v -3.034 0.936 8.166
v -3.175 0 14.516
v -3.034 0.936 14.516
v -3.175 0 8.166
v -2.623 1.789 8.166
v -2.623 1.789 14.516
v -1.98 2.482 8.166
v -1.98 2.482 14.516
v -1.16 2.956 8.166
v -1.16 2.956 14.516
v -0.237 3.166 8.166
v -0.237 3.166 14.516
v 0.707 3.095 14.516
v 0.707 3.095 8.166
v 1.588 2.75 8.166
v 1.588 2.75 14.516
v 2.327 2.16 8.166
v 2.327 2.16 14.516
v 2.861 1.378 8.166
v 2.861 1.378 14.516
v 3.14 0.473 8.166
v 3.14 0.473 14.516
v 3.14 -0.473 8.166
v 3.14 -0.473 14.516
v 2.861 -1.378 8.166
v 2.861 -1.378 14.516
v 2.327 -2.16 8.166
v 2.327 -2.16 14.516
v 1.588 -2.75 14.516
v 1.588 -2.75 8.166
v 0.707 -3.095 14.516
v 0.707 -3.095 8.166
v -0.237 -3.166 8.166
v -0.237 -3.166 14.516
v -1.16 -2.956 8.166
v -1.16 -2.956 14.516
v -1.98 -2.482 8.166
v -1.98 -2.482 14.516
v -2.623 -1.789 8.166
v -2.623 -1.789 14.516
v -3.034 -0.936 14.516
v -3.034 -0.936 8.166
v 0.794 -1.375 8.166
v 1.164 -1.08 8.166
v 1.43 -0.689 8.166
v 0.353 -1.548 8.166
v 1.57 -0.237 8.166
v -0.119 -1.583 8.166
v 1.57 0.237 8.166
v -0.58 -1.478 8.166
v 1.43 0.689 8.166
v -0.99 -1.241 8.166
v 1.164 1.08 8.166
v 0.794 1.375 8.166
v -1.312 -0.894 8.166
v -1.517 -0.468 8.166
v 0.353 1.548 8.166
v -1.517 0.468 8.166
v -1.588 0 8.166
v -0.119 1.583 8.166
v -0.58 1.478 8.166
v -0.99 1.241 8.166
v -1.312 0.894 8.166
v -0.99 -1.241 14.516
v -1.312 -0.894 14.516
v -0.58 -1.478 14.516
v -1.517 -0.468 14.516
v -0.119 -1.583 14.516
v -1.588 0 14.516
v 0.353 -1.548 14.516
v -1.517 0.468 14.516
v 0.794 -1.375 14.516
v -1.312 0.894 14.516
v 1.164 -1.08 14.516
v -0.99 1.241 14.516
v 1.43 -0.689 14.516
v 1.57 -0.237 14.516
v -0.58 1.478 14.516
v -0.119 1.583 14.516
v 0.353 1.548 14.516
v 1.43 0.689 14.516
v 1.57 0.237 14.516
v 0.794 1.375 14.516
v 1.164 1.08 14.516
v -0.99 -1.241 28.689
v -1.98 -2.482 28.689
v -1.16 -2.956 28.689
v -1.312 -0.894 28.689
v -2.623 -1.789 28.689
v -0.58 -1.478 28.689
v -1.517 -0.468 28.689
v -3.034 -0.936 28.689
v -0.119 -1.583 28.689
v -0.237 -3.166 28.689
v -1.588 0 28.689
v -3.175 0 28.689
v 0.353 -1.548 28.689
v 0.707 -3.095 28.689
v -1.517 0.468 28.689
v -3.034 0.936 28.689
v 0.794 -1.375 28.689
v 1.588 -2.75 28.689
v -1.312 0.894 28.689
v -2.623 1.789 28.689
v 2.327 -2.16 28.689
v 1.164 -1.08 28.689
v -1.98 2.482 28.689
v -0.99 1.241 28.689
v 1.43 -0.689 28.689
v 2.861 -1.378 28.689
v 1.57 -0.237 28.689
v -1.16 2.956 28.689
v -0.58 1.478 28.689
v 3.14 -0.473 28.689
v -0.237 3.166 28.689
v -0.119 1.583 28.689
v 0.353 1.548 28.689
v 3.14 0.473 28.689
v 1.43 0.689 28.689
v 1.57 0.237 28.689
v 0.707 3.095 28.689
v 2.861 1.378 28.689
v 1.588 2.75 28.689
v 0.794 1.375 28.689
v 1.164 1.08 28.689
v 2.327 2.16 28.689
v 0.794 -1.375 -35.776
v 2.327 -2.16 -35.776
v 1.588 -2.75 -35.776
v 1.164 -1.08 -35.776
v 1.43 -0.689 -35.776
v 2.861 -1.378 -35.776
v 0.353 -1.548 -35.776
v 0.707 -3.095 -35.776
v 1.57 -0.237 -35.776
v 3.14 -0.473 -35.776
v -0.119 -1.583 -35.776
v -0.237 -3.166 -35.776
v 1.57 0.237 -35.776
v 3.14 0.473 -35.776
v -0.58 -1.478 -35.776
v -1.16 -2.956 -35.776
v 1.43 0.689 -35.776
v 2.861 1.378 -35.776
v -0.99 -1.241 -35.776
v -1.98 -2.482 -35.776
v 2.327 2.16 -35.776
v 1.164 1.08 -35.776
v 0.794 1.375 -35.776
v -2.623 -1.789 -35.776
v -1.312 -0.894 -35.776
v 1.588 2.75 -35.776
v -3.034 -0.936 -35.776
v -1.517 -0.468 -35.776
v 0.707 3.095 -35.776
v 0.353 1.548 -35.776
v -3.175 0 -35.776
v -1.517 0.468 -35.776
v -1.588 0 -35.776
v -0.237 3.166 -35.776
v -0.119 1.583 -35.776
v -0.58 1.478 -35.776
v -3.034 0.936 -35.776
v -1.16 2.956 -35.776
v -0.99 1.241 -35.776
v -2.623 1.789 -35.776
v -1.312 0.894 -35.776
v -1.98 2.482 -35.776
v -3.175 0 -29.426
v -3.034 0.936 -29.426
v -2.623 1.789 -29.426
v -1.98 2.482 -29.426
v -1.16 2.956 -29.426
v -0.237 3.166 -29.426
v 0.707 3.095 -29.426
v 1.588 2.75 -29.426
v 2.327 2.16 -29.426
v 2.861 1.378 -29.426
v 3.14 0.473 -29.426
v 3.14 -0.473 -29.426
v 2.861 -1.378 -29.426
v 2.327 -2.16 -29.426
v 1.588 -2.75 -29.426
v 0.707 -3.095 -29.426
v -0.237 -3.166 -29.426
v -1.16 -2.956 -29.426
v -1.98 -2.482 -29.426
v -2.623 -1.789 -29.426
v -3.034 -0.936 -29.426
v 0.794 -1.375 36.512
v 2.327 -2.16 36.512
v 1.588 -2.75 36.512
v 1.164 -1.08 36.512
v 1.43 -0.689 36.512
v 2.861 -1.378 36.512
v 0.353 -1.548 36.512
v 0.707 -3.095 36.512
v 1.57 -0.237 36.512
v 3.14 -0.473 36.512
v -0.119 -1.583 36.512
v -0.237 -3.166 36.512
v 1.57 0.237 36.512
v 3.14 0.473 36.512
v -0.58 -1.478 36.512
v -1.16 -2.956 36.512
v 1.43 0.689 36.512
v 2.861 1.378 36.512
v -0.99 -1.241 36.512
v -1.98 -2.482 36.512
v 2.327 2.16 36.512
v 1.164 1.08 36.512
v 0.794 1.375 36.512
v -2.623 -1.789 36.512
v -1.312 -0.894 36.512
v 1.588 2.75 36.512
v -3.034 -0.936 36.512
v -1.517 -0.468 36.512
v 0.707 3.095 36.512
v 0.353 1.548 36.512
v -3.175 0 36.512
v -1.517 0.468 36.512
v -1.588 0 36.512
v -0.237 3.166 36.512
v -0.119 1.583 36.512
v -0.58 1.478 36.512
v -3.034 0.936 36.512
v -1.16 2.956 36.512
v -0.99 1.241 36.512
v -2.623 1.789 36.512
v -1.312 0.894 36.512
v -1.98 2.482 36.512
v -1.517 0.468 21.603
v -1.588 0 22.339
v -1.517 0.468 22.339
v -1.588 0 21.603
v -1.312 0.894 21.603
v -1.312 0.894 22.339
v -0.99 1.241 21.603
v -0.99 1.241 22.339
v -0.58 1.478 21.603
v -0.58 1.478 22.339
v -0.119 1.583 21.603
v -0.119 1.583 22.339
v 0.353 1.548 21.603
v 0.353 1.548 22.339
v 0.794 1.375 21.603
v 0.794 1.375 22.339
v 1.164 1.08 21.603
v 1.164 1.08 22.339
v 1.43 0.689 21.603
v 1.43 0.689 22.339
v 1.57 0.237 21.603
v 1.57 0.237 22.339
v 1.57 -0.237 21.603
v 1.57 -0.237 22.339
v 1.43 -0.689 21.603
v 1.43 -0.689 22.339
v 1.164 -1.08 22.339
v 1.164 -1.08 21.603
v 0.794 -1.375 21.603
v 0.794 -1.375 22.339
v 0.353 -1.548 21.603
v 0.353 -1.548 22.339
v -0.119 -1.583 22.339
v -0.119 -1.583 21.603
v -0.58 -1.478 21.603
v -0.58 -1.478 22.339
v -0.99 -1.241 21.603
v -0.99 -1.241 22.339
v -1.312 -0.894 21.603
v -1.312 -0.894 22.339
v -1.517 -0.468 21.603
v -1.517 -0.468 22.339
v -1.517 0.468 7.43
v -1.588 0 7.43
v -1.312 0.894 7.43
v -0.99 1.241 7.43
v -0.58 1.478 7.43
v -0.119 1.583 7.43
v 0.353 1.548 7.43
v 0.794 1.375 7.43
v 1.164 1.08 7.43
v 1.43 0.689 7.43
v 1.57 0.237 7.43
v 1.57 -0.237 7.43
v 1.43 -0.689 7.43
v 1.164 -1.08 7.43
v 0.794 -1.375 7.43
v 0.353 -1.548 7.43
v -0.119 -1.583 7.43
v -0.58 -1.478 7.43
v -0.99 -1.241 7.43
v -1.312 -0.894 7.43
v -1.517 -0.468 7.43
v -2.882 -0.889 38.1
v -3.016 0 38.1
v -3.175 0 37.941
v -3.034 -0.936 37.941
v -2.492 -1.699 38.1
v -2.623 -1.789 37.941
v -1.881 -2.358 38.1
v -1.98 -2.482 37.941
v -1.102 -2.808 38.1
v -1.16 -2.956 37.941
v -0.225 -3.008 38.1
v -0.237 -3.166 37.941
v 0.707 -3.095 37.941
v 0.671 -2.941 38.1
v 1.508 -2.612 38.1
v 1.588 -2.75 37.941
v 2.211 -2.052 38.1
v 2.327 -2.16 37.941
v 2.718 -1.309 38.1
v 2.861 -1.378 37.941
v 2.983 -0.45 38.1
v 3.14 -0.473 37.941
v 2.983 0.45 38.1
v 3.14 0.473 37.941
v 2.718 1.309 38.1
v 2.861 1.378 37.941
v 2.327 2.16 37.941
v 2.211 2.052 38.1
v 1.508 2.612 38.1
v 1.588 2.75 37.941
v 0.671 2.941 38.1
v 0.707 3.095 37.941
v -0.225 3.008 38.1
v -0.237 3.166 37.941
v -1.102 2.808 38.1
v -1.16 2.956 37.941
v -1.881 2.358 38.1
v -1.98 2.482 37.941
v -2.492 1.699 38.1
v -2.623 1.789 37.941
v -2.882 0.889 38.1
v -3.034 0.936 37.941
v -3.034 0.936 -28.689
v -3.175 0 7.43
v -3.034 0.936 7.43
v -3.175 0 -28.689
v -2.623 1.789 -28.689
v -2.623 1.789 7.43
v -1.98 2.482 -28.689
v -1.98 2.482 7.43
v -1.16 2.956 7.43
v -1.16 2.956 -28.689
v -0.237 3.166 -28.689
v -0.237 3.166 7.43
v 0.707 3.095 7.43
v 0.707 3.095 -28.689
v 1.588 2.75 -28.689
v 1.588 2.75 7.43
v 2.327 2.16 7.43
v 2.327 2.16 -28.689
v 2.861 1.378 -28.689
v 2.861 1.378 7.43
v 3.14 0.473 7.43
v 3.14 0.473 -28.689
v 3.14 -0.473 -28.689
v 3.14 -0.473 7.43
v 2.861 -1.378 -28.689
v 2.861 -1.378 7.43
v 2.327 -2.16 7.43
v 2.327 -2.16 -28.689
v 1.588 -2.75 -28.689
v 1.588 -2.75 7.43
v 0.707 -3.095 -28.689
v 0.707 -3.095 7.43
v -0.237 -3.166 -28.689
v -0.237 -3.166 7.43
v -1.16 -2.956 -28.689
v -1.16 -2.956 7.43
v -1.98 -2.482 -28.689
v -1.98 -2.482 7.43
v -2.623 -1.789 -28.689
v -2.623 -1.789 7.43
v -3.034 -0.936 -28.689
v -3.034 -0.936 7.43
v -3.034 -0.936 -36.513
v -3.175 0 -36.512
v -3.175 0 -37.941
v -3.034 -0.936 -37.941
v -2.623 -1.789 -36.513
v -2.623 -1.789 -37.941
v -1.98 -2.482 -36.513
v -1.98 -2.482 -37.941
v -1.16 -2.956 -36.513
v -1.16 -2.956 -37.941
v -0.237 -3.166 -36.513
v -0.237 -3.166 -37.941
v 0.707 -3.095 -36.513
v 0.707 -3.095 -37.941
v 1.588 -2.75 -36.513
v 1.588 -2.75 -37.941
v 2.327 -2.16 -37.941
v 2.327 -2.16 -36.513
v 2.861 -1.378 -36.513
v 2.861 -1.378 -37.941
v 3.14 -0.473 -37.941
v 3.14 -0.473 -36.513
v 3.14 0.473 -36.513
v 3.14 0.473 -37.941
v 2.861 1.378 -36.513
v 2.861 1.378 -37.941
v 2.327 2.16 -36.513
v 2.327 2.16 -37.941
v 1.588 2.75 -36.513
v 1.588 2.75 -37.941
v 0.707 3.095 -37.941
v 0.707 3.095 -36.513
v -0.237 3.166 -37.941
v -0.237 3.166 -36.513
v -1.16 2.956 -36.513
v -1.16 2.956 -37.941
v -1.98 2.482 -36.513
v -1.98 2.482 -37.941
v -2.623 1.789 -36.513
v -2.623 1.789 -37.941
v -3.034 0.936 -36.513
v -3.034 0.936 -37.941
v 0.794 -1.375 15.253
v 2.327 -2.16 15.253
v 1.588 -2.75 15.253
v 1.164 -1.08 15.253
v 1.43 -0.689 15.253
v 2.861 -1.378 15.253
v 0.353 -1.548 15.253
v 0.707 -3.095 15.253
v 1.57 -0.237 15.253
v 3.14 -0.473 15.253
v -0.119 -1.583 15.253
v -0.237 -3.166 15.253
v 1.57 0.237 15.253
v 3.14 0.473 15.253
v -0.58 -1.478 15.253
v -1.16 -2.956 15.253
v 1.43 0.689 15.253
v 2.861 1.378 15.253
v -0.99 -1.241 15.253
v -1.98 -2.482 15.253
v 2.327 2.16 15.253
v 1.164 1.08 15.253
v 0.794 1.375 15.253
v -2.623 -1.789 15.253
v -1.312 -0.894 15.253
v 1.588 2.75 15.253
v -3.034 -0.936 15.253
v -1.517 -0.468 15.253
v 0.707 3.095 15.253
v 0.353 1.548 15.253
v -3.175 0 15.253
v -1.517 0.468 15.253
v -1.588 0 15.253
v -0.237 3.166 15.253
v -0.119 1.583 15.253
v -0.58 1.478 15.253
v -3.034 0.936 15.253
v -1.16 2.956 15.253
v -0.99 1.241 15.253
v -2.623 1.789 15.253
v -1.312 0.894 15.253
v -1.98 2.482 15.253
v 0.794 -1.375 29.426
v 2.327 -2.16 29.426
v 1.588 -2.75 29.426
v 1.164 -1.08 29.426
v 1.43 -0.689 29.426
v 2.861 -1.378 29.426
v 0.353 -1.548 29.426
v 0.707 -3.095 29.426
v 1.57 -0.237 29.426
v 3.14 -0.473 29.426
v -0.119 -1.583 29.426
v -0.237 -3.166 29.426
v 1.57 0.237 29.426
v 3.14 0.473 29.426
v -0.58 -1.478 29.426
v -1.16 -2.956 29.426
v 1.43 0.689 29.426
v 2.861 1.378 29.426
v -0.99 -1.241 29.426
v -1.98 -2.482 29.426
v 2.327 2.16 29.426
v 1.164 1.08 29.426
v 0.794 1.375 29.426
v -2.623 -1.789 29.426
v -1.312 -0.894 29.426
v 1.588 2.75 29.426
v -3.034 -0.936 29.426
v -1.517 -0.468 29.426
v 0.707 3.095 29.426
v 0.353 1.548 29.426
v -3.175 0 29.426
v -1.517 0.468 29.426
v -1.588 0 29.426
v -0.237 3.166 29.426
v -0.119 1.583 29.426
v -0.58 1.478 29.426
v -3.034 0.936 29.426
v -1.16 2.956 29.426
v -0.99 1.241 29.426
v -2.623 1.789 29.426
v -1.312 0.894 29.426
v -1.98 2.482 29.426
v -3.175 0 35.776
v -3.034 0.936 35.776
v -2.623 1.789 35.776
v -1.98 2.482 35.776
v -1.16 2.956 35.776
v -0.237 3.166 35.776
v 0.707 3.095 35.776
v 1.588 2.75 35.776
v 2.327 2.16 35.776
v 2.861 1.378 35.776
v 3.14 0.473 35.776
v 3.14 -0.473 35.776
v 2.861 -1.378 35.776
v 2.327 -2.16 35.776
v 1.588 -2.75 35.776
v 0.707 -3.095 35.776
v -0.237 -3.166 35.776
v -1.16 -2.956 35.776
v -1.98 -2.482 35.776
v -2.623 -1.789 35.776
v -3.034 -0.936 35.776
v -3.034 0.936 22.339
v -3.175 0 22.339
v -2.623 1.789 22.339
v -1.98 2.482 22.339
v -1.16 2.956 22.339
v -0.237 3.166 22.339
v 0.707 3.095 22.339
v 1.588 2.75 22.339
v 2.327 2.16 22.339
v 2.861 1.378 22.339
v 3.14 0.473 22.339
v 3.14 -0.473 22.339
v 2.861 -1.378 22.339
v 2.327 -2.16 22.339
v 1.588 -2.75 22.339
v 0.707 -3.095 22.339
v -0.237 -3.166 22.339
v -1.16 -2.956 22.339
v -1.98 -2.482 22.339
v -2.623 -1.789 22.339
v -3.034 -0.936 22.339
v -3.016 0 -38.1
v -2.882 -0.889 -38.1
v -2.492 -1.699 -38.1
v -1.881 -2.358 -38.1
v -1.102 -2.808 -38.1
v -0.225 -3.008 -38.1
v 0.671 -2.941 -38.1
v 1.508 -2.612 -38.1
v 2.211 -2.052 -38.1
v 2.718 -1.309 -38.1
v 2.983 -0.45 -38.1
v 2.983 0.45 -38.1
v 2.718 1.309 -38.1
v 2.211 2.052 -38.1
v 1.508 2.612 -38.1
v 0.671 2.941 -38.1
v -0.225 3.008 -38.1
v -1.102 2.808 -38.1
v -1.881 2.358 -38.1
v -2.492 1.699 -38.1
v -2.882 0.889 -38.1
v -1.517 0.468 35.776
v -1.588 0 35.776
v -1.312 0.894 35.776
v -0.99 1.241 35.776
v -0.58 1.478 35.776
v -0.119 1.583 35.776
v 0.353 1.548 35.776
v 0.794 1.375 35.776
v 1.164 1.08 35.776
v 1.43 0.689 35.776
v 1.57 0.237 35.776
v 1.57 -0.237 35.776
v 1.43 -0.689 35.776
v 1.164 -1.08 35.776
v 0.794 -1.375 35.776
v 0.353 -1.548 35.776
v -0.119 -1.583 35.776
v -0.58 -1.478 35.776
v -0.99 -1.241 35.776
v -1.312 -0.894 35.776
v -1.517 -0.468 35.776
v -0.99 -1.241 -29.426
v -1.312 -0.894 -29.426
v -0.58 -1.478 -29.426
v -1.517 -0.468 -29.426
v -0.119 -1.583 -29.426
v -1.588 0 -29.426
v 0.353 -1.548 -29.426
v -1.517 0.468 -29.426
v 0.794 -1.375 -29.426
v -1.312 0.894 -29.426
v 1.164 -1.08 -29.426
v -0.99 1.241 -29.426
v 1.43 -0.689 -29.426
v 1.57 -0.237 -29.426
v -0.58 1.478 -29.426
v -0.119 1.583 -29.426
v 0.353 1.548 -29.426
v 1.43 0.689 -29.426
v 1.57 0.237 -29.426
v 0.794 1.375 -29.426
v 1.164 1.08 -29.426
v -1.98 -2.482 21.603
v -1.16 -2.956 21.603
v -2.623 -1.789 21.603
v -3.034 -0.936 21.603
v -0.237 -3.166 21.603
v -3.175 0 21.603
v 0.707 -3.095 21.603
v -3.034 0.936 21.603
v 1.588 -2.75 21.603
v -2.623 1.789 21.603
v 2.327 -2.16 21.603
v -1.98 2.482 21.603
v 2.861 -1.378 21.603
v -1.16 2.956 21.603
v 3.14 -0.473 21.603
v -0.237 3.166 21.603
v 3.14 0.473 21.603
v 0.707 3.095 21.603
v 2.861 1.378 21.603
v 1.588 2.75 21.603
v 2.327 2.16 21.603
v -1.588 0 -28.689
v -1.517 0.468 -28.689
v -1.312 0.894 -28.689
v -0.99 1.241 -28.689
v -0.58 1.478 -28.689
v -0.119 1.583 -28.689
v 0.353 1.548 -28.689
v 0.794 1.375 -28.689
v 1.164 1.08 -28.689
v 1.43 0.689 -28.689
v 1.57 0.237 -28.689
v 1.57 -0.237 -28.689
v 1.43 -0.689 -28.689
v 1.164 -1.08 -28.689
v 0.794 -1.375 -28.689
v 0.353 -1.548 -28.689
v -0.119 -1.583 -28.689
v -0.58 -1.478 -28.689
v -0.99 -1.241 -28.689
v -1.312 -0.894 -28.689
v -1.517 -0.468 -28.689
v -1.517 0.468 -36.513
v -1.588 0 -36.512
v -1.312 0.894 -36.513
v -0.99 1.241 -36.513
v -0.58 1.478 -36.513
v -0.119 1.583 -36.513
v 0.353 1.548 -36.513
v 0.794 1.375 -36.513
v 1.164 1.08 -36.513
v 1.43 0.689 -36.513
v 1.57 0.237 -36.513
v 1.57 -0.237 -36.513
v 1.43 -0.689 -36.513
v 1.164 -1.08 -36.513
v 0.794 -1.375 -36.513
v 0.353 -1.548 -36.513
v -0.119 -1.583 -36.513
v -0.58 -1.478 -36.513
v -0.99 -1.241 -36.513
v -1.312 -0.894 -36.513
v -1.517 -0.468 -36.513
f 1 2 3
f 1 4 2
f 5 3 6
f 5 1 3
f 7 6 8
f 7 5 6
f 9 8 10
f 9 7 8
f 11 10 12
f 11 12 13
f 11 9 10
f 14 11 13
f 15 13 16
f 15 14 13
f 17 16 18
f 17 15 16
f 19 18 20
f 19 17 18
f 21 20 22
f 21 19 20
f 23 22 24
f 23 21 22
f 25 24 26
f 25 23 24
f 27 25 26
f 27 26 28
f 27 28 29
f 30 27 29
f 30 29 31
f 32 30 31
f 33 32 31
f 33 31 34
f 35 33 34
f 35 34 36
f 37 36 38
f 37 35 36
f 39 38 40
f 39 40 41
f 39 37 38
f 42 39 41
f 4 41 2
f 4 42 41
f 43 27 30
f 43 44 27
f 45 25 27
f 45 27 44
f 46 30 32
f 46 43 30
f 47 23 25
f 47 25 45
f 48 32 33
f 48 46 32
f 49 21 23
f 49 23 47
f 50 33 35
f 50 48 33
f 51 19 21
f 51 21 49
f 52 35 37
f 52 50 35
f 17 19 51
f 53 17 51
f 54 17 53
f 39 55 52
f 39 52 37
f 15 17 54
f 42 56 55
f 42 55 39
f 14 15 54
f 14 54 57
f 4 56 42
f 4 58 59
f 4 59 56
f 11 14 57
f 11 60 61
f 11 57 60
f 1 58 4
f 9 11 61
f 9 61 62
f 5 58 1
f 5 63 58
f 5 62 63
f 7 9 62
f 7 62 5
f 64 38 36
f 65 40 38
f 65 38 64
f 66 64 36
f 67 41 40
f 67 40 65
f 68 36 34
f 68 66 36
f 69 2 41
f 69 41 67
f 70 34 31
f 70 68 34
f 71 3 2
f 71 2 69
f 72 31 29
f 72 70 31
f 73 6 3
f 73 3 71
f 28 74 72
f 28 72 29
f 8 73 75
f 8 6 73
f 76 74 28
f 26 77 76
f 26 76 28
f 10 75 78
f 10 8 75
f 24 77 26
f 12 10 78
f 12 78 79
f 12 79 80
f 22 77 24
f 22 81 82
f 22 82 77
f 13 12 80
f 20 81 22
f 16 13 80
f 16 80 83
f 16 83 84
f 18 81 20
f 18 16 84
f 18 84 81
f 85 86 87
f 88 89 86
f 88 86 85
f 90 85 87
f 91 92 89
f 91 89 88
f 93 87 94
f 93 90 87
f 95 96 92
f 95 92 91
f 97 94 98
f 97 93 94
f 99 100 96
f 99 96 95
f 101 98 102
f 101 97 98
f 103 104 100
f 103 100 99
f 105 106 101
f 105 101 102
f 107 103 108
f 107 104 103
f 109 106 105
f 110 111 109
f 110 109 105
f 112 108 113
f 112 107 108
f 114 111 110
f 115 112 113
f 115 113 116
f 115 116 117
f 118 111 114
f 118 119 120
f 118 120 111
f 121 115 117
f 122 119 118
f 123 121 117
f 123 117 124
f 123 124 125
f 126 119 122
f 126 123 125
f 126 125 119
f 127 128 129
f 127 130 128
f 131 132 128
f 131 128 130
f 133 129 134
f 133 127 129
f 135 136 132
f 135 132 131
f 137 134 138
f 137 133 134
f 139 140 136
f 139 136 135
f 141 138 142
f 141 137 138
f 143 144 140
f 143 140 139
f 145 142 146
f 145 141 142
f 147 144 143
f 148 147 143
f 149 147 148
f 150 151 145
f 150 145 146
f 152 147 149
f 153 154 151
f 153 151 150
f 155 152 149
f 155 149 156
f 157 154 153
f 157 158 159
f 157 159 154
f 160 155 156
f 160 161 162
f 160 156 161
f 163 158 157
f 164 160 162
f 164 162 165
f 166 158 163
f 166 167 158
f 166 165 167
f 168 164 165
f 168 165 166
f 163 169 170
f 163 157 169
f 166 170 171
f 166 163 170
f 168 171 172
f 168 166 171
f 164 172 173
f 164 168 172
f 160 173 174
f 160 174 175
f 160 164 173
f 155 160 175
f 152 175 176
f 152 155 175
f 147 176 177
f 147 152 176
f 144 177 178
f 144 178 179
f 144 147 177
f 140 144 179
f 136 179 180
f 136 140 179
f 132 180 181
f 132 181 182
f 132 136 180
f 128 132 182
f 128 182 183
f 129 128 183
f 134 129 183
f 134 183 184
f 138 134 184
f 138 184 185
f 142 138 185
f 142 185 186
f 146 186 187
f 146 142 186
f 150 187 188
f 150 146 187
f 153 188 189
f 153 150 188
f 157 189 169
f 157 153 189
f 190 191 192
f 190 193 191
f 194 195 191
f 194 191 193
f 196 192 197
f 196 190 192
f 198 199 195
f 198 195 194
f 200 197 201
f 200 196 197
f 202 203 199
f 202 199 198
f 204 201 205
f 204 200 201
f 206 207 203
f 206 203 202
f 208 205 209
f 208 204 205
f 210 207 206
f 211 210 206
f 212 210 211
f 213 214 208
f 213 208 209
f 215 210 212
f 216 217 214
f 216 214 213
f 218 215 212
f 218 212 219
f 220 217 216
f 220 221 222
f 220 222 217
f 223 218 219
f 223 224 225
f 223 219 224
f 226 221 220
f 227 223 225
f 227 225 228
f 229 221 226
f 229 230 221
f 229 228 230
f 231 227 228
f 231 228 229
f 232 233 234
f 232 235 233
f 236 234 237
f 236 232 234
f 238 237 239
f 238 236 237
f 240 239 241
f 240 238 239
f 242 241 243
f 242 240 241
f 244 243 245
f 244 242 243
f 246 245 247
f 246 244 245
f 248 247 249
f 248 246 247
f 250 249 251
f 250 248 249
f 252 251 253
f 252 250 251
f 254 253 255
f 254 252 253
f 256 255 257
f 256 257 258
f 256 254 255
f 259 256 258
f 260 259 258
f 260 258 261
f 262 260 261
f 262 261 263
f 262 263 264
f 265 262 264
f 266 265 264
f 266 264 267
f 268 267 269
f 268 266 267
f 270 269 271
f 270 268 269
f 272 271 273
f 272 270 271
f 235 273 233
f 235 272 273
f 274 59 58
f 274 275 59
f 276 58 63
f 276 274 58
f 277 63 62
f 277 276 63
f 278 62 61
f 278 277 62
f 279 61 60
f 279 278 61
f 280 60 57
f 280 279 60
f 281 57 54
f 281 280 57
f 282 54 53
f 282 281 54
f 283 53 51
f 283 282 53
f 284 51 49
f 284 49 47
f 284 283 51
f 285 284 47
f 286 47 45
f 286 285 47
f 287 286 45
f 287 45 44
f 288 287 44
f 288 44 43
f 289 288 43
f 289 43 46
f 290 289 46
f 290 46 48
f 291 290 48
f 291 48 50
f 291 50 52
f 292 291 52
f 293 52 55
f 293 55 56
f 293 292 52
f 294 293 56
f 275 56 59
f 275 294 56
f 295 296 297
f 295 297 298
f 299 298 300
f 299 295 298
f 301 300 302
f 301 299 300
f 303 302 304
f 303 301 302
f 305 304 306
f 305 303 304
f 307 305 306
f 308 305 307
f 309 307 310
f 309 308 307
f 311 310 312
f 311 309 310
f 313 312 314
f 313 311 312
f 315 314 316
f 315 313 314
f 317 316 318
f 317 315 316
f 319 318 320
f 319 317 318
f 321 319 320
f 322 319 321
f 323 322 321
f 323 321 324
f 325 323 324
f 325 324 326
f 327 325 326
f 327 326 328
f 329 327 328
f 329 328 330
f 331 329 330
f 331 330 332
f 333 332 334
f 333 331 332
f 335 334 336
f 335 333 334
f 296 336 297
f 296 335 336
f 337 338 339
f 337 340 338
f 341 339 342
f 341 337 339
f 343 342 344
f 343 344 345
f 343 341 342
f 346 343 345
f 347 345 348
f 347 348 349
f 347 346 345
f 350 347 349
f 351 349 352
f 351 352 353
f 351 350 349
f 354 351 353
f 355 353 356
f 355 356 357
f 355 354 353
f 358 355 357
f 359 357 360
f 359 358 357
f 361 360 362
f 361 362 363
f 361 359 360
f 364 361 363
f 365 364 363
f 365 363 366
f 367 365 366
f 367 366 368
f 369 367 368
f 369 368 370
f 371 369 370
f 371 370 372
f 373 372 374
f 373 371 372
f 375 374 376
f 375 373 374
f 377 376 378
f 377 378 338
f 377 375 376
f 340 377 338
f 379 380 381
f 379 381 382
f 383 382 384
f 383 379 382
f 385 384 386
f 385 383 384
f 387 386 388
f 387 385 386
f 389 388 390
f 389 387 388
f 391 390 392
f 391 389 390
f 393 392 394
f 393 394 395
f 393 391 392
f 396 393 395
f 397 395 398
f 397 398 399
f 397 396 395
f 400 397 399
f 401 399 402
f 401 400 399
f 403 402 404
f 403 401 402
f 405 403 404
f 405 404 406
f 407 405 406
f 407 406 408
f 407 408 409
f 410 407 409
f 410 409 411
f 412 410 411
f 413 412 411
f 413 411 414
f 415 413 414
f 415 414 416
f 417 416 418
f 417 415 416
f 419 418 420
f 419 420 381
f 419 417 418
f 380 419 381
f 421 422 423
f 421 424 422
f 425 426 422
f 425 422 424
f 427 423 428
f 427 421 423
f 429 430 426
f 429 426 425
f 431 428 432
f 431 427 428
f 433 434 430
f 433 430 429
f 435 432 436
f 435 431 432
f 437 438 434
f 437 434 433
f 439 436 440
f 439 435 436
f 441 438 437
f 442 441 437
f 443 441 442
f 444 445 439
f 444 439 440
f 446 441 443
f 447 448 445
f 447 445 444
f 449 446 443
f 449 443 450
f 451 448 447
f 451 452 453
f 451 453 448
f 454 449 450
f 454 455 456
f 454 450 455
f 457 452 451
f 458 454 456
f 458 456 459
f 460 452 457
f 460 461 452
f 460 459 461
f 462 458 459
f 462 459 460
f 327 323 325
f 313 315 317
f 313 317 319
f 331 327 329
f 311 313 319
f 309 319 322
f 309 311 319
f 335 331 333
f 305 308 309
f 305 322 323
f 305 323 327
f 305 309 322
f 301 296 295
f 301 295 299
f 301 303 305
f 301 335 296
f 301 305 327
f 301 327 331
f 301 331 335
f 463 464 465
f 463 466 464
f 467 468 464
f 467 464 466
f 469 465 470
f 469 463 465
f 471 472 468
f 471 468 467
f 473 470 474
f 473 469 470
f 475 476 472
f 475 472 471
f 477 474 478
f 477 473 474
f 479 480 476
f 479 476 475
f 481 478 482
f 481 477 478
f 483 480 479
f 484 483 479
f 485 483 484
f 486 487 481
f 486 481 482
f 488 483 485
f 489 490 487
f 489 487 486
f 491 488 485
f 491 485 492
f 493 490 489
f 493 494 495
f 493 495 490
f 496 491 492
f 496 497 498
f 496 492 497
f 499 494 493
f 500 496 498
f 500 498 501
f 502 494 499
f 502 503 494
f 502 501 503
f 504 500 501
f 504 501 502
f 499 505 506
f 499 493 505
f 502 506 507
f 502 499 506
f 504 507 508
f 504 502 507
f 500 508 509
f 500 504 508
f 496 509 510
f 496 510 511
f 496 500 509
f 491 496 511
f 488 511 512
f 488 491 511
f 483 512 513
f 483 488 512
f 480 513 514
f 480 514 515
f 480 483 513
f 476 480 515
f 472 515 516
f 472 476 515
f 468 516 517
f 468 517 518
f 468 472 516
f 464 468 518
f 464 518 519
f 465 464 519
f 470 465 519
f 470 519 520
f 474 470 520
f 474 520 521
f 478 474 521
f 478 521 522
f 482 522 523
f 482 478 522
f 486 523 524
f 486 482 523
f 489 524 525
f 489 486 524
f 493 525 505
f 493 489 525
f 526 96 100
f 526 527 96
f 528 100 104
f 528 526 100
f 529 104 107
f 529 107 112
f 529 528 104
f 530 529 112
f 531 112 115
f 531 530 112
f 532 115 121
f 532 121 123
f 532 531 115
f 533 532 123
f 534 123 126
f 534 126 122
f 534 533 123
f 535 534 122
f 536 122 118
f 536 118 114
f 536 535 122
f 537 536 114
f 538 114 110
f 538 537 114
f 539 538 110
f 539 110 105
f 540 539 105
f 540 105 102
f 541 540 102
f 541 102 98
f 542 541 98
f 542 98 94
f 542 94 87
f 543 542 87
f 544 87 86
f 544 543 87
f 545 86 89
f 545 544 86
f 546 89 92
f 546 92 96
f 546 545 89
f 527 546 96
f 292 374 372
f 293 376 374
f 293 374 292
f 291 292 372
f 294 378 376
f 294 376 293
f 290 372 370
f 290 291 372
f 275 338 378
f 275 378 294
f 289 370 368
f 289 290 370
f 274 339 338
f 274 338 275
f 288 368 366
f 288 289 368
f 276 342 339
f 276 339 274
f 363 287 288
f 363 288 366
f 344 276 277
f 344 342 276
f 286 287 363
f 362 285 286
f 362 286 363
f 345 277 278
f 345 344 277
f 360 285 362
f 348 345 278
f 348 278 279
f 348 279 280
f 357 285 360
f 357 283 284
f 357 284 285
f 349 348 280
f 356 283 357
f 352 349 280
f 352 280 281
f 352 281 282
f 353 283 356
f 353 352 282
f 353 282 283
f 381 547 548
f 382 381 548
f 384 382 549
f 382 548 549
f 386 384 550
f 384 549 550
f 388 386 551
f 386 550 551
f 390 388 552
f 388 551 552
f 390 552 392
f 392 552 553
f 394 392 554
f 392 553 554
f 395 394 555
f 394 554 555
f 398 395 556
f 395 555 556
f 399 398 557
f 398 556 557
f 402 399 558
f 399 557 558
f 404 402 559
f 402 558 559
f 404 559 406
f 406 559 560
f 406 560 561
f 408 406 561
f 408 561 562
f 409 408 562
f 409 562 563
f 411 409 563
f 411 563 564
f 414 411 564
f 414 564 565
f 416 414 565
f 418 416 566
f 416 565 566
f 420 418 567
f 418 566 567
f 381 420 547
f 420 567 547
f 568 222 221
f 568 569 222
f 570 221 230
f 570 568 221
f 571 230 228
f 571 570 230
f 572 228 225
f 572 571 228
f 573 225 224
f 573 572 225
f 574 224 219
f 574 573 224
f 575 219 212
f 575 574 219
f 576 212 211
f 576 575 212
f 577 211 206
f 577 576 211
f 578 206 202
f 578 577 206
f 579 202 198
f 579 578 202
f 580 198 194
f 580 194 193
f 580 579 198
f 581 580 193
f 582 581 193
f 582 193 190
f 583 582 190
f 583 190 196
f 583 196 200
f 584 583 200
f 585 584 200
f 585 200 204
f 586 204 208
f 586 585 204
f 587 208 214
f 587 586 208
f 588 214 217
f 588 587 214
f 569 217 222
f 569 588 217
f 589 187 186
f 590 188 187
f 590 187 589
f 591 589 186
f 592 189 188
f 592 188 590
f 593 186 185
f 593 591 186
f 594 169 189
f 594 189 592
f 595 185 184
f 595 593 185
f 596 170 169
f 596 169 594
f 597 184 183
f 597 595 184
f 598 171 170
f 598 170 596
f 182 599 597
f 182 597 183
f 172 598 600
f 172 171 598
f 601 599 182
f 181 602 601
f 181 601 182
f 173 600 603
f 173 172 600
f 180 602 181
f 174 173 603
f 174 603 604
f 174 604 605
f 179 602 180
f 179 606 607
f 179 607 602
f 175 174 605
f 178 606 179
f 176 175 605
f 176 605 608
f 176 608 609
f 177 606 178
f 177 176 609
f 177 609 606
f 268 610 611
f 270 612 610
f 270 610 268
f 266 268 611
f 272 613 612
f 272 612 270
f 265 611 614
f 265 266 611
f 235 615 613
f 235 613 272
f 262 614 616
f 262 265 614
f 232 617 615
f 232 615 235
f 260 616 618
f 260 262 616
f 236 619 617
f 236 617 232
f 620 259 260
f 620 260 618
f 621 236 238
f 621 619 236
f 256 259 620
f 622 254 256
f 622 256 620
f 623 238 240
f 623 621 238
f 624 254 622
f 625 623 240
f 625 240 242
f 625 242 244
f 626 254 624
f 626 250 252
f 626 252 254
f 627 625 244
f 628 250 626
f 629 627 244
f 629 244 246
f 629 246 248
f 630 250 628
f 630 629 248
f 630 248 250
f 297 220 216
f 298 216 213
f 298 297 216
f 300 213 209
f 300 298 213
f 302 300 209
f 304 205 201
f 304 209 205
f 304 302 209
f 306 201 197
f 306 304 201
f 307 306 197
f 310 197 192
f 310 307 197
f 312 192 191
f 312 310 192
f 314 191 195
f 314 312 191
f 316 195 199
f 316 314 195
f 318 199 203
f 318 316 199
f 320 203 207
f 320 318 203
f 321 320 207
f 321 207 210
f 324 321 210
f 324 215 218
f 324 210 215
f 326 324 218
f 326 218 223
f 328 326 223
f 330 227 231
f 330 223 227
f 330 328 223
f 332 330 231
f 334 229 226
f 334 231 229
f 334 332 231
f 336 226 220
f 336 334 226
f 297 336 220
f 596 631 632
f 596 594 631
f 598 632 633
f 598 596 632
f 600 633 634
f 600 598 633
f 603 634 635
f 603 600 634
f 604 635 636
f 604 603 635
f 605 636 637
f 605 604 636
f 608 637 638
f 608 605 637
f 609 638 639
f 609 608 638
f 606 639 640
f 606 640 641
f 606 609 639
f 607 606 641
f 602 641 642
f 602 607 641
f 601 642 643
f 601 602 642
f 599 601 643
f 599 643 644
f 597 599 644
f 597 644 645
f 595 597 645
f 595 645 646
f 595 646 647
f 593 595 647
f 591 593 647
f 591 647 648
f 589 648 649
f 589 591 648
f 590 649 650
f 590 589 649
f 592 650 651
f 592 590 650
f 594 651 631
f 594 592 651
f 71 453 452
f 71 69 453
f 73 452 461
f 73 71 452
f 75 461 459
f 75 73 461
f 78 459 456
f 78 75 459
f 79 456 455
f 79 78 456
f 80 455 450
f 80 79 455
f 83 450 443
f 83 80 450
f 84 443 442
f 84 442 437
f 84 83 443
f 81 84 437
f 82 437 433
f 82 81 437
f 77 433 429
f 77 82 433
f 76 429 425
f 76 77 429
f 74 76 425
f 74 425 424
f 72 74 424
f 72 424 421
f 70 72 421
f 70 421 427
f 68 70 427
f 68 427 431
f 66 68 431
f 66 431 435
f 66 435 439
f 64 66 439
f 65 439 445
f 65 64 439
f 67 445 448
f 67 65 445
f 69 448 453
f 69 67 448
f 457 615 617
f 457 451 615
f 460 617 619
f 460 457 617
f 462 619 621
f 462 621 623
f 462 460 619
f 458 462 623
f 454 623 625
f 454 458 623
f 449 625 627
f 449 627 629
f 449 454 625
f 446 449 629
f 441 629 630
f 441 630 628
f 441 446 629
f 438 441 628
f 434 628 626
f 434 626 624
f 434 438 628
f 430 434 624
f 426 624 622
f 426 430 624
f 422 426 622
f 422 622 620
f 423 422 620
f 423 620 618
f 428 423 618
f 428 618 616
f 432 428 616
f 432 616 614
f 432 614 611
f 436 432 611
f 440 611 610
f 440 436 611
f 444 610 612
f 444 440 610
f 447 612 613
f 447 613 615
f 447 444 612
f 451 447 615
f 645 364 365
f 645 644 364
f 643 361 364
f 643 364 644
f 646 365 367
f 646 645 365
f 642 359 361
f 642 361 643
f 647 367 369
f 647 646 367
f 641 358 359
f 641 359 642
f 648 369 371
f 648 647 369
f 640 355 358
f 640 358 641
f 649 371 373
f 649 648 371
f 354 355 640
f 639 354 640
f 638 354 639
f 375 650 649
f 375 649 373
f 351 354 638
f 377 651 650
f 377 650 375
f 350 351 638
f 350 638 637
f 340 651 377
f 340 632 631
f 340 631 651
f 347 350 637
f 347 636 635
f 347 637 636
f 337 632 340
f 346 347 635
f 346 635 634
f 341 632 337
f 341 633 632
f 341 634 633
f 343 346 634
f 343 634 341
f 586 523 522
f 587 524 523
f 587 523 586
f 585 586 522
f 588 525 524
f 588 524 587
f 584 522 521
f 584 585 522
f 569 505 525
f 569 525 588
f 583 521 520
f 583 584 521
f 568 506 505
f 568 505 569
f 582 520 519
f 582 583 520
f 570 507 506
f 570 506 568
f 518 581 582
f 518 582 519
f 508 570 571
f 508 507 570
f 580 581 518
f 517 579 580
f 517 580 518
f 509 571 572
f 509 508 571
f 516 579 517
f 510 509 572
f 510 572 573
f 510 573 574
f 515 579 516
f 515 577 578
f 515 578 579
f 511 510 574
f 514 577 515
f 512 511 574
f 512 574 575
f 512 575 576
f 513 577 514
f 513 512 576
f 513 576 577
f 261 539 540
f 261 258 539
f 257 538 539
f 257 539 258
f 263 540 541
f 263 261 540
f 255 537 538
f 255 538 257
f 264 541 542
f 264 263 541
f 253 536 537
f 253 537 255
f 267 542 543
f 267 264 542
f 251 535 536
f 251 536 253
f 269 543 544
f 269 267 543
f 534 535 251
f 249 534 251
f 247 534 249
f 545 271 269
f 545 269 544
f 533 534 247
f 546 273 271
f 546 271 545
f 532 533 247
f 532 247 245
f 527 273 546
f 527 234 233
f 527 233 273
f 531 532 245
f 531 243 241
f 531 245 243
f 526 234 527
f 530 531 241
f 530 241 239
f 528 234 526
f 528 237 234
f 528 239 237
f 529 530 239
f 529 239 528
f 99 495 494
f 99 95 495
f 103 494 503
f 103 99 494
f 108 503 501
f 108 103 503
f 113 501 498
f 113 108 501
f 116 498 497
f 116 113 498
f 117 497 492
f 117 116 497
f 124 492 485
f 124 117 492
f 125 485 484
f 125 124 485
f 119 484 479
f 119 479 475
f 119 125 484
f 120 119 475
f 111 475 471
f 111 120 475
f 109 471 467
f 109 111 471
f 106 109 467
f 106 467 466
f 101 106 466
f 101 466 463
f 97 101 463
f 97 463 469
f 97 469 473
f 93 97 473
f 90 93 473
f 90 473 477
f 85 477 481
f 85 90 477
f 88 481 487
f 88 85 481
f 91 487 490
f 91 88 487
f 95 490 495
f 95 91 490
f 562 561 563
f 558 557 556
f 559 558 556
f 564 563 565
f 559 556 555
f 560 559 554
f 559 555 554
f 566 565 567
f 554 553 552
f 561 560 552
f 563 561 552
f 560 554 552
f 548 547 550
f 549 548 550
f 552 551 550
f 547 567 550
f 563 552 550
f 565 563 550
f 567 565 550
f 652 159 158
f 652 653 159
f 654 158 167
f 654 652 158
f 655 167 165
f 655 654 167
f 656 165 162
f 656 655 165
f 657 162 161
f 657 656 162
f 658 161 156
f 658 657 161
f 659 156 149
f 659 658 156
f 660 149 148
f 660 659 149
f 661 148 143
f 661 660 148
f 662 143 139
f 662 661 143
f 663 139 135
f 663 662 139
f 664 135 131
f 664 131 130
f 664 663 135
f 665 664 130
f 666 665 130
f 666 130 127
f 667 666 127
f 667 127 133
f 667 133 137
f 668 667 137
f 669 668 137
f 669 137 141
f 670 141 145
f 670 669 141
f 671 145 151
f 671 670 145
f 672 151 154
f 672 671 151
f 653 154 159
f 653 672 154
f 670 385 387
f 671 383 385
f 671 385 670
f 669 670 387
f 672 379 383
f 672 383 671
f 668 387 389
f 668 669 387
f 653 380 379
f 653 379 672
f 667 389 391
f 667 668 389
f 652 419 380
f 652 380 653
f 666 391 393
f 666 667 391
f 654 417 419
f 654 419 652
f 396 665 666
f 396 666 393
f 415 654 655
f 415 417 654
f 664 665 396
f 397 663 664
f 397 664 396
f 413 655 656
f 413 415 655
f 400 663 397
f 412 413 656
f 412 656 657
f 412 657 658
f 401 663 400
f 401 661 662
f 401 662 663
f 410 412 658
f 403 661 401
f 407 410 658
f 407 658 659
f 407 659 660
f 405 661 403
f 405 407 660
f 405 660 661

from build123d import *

# Parameters (mm, degrees)
SKETCH1_R      = 3.175
EXTRUDE1_DEPTH = 38.1
CHAMFER1_SIZE  = 0.15875


with BuildPart() as part:
    # Sketch1 → Extrude1 (new, symmetric)
    with BuildSketch(Plane.XY):
        with Locations(Location((0, 0, 0), (0, 0, 180))):
            Circle(SKETCH1_R)
    extrude(amount=EXTRUDE1_DEPTH, both=True)

    # Sketch6 → Cut-Revolve2 (revolve, cut)
    with BuildSketch(Plane(origin=(0, 0, 0), x_dir=(0, 0, -1), z_dir=(1, 0, 0)), mode=Mode.PRIVATE) as cut_revolve2_sk:
        Polygon((-36.5125, 3.175), (-36.5125, 1.5875), (-35.7759, 1.5875), (-35.7759, 3.175), (-29.4259, 3.175), (-29.4259, 1.5875), (-28.6893, 1.5875), (-28.6893, 3.175), (-22.3393, 3.175), (-22.3393, 1.5875), (-21.6027, 1.5875), (-21.6027, 3.175), (-15.2527, 3.175), (-15.2527, 1.5875), (-14.5161, 1.5875), (-14.5161, 3.175), (-8.1661, 3.175), (-8.1661, 1.5875), (-7.4295, 1.5875), (-7.4295, 3.175), (28.6893, 3.175), (28.6893, 1.5875), (29.4259, 1.5875), (29.4259, 3.175), (35.7759, 3.175), (35.7759, 1.5875), (36.5125, 1.5875), (36.5125, 3.175), (38.1, 3.175), (38.1, 5.715), (-38.1, 5.715), (-38.1, 3.175), align=None)
    revolve(cut_revolve2_sk.sketch.rotate(Axis((0, 0, 38.1), (0, 0, -1)), 270), axis=Axis((0, 0, 38.1), (0, 0, -1)), mode=Mode.SUBTRACT)

    # Chamfer1
    chamfer1_edges = [part.edges().sort_by_distance(p)[0] for p in [
        (3.175, 0, -38.1),
        (3.175, 0, 38.1),
    ]]
    chamfer(chamfer1_edges, length=CHAMFER1_SIZE)


solid = part.part
